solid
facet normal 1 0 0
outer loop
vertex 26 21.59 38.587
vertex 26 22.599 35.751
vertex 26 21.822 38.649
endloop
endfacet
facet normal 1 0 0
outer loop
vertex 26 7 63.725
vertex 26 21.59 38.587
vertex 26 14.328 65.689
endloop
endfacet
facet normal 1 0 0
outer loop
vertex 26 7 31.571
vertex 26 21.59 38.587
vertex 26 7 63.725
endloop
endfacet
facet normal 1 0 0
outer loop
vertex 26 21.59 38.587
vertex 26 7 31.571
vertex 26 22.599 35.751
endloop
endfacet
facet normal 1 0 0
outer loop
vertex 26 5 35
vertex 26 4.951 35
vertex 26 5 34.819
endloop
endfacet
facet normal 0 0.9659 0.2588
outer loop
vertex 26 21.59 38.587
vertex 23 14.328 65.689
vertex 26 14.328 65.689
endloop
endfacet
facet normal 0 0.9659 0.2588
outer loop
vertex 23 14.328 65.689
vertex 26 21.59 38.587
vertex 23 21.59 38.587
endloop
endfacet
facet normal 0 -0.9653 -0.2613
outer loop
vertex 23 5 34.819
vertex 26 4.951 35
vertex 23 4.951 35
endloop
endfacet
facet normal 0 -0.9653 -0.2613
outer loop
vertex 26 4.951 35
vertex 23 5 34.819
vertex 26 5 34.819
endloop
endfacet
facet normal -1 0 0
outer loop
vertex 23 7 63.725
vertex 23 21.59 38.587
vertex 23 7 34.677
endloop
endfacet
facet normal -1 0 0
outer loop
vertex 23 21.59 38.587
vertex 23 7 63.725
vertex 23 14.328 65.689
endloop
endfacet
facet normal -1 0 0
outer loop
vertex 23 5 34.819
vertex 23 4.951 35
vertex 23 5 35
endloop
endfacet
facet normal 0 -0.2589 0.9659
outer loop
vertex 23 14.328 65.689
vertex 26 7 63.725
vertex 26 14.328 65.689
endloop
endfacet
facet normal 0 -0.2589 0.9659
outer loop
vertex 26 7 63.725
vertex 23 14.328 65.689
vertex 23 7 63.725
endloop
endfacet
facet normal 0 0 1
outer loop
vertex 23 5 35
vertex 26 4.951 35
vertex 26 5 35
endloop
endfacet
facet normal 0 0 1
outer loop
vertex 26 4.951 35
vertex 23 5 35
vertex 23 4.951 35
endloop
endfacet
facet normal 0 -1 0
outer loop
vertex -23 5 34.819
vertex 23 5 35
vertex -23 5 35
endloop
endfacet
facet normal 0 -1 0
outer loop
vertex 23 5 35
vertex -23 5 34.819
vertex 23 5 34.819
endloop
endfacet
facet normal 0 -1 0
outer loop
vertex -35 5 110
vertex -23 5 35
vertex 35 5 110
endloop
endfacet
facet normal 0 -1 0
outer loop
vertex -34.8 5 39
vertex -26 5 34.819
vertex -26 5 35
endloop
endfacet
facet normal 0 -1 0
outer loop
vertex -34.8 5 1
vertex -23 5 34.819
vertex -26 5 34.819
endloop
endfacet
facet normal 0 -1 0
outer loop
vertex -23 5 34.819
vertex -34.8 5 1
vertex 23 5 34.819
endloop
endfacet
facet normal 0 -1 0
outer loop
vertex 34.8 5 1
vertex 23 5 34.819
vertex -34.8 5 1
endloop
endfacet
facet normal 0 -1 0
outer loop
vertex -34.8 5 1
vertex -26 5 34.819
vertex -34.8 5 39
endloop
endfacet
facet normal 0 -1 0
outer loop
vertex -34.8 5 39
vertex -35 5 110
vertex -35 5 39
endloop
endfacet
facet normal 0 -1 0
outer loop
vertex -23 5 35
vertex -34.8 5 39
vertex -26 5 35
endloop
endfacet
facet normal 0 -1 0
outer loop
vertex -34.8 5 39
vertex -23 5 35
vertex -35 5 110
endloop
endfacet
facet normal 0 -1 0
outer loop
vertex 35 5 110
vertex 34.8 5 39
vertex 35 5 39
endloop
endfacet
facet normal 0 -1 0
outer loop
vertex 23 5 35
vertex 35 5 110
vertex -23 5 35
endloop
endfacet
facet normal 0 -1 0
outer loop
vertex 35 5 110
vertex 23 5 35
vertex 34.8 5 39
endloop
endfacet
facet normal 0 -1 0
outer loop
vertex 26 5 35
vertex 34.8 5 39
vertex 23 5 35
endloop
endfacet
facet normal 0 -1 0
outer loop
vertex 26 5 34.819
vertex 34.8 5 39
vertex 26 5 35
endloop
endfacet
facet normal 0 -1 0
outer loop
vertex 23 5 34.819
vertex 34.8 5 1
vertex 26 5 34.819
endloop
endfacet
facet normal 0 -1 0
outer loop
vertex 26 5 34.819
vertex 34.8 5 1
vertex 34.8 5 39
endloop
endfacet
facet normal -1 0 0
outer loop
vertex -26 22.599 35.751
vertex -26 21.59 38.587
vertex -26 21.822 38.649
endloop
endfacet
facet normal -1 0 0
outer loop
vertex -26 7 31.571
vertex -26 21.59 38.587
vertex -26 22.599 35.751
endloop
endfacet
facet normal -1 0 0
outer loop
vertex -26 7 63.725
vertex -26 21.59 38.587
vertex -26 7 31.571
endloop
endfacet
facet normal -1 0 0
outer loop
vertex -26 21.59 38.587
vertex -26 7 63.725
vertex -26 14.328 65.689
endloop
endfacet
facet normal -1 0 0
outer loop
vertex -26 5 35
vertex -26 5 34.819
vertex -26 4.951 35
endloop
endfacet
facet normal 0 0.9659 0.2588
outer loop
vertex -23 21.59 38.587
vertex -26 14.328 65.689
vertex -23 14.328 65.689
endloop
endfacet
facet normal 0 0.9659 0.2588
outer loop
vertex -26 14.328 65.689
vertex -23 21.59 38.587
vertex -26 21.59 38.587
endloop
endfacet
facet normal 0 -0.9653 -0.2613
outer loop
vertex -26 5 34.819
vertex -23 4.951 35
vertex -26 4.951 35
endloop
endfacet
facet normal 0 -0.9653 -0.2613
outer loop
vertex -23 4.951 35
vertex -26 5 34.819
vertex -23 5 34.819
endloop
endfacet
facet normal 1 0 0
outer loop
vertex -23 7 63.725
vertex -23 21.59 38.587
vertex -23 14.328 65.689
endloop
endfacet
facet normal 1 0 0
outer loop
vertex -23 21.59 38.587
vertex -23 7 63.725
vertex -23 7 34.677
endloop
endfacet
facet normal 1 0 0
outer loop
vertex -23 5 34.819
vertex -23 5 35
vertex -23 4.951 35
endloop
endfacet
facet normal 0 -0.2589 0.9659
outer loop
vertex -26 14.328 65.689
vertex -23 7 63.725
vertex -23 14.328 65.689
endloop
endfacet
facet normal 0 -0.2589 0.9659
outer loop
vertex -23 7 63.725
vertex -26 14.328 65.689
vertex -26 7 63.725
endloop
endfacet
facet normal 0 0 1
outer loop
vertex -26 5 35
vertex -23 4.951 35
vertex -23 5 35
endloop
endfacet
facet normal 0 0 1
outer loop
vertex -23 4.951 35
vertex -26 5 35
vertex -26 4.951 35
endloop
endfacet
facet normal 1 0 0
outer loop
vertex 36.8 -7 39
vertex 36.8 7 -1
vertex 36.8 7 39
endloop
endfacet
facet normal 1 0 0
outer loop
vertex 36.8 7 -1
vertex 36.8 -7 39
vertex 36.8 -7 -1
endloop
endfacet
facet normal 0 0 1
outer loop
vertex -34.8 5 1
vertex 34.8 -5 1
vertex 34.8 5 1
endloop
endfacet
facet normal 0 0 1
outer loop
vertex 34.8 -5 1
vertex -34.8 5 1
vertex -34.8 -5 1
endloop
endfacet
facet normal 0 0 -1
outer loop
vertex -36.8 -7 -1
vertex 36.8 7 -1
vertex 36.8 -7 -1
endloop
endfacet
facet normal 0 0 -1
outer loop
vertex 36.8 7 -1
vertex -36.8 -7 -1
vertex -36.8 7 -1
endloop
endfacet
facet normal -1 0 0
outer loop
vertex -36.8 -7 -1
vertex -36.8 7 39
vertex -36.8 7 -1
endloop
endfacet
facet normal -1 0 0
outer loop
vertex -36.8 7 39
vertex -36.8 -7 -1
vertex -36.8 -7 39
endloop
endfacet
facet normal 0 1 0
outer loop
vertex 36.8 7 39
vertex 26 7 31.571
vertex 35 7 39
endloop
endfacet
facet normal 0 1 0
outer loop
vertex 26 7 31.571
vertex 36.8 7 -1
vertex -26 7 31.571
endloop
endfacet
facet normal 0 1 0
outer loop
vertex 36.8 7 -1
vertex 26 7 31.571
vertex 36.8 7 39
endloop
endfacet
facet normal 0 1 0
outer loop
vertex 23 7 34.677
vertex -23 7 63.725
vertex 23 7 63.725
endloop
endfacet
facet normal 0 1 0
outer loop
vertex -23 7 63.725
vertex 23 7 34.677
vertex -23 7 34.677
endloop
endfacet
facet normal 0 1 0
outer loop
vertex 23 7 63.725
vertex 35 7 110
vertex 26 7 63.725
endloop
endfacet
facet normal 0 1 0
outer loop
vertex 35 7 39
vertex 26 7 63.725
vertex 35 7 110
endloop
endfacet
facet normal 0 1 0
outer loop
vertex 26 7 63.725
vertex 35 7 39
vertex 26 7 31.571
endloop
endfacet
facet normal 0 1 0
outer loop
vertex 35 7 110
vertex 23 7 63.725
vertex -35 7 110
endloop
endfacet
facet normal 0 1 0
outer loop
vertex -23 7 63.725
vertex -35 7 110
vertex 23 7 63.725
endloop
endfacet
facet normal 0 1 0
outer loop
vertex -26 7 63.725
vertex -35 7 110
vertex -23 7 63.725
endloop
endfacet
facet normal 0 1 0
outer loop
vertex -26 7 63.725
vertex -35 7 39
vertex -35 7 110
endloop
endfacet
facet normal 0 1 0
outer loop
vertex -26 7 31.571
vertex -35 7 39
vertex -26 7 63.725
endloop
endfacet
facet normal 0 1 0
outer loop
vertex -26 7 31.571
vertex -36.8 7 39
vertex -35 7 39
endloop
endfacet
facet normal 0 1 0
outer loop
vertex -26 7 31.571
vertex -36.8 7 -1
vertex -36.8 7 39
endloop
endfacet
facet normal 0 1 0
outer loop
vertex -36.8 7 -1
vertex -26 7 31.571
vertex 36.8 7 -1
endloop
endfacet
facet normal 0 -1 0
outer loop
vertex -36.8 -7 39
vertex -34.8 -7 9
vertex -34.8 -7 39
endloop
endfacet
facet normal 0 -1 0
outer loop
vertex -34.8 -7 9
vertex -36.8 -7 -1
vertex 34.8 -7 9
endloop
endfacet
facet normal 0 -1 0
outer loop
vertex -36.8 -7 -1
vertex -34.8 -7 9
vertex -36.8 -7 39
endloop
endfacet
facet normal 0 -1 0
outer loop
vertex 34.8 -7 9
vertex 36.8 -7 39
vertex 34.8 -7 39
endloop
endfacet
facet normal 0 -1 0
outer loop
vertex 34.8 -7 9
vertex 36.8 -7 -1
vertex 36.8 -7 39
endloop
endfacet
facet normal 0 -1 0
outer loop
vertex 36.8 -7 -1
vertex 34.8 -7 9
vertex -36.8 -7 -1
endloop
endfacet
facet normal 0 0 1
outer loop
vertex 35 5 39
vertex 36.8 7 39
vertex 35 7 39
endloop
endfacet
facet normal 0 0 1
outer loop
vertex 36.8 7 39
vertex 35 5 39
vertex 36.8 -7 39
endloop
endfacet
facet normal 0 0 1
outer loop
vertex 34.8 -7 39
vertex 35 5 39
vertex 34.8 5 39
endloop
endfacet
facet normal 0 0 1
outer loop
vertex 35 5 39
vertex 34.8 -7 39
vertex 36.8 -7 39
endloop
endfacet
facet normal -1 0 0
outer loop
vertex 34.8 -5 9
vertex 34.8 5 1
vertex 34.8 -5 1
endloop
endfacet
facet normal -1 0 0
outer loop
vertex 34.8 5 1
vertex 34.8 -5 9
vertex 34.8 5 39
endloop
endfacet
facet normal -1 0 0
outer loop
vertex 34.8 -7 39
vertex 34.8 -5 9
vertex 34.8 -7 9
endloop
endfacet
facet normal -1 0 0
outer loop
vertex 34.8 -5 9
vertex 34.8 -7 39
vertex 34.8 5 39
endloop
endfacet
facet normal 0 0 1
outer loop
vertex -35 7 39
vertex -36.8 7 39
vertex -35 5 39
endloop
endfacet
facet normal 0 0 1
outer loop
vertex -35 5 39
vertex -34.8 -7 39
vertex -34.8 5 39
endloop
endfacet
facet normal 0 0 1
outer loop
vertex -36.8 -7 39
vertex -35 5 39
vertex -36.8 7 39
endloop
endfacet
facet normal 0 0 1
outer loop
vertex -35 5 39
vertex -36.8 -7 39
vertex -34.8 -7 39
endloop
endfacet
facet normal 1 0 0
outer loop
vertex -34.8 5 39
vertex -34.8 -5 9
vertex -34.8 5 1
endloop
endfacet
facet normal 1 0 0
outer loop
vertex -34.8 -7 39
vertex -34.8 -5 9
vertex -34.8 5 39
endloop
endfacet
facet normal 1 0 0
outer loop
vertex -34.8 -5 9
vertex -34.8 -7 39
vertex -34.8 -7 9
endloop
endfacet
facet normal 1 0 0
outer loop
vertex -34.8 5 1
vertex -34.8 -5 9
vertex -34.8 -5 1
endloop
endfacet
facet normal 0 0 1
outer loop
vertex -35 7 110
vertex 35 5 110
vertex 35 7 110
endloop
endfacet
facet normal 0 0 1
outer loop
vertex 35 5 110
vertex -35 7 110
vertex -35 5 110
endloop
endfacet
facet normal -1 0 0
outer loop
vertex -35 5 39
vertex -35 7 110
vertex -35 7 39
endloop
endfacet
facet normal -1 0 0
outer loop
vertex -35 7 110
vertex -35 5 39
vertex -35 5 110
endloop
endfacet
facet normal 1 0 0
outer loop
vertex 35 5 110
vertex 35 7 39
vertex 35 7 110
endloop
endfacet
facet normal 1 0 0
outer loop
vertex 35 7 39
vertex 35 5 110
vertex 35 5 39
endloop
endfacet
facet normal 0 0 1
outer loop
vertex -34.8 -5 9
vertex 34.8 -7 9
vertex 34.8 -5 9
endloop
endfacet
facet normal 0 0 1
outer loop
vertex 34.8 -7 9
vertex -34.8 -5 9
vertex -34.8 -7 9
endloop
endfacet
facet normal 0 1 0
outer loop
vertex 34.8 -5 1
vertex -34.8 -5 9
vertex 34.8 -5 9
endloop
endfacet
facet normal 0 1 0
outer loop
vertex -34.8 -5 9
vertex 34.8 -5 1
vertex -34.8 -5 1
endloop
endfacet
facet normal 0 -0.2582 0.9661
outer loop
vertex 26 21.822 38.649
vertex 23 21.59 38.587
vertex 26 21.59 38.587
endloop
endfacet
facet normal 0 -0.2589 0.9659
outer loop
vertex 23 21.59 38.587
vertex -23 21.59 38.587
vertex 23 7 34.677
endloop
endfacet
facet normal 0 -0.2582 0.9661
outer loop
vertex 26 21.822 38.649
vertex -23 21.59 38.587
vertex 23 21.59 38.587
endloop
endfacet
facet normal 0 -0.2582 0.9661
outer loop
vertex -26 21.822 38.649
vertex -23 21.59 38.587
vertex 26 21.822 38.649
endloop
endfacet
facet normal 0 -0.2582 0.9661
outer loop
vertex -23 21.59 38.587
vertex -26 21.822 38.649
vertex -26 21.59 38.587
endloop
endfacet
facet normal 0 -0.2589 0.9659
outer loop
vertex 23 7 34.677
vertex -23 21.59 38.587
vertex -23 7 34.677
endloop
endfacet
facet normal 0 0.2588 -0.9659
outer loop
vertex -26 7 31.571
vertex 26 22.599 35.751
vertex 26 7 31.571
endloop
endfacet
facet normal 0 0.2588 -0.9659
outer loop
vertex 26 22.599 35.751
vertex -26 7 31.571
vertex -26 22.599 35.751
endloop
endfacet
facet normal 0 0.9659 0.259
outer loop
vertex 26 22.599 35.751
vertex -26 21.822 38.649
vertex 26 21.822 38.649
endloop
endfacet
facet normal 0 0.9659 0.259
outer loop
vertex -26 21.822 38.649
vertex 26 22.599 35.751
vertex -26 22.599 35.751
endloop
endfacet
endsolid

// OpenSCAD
baseX = 73.6;
baseY = 14;
baseZ = 2;

lateralX = 2;
lateralY = 14;
lateralZ = 40;

backX = 2;
backY = 70;
backZ = 110;

frontX = 2;
frontY = 73.6;
frontZ = 10;

backPlateX = 52;
backPlateY = 17;
backPlateZ = 3;

module phoneHolder(){
    cube([baseX, baseY, baseZ], center = true);
    
    lateral();
    
    mirror([1, 0, 0]){
        lateral();
    }
        
    rotate([0, 0, 90]){
        translate([baseY / 2 - backX / 2, 0, backZ / 2])
        cube([backX, backY, backZ], center = true);
    }    
    rotate([0, 0, 90]){
        translate([- baseY / 2 + frontX / 2, 0, frontZ / 2 - baseZ / 2])
            cube([frontX, frontY, frontZ], center = true);
    }
    
    translate([0, 14, 35]){
        rotate([15, 0, 0])
        cube([backPlateX, backPlateY, backPlateZ], center = true);
    }    
    
    back_lateral();

    mirror([1, 0, 0])
    back_lateral();
}     

module lateral(){
    translate([baseX / 2 - lateralX / 2, 0, lateralZ / 2 - baseZ / 2])
        cube([lateralX, lateralY, lateralZ], center = true);
}

module back_lateral(){
    difference(){
        translate([backPlateX / 2 - 1.5, 10, 49]){
            rotate([-75, 0, 0])
            cube([3, 30, 17], center = true);
        }
        translate([0, 0, 50])
        cube([60, 10, 30], center = true);
    }
    
}

phoneHolder();
